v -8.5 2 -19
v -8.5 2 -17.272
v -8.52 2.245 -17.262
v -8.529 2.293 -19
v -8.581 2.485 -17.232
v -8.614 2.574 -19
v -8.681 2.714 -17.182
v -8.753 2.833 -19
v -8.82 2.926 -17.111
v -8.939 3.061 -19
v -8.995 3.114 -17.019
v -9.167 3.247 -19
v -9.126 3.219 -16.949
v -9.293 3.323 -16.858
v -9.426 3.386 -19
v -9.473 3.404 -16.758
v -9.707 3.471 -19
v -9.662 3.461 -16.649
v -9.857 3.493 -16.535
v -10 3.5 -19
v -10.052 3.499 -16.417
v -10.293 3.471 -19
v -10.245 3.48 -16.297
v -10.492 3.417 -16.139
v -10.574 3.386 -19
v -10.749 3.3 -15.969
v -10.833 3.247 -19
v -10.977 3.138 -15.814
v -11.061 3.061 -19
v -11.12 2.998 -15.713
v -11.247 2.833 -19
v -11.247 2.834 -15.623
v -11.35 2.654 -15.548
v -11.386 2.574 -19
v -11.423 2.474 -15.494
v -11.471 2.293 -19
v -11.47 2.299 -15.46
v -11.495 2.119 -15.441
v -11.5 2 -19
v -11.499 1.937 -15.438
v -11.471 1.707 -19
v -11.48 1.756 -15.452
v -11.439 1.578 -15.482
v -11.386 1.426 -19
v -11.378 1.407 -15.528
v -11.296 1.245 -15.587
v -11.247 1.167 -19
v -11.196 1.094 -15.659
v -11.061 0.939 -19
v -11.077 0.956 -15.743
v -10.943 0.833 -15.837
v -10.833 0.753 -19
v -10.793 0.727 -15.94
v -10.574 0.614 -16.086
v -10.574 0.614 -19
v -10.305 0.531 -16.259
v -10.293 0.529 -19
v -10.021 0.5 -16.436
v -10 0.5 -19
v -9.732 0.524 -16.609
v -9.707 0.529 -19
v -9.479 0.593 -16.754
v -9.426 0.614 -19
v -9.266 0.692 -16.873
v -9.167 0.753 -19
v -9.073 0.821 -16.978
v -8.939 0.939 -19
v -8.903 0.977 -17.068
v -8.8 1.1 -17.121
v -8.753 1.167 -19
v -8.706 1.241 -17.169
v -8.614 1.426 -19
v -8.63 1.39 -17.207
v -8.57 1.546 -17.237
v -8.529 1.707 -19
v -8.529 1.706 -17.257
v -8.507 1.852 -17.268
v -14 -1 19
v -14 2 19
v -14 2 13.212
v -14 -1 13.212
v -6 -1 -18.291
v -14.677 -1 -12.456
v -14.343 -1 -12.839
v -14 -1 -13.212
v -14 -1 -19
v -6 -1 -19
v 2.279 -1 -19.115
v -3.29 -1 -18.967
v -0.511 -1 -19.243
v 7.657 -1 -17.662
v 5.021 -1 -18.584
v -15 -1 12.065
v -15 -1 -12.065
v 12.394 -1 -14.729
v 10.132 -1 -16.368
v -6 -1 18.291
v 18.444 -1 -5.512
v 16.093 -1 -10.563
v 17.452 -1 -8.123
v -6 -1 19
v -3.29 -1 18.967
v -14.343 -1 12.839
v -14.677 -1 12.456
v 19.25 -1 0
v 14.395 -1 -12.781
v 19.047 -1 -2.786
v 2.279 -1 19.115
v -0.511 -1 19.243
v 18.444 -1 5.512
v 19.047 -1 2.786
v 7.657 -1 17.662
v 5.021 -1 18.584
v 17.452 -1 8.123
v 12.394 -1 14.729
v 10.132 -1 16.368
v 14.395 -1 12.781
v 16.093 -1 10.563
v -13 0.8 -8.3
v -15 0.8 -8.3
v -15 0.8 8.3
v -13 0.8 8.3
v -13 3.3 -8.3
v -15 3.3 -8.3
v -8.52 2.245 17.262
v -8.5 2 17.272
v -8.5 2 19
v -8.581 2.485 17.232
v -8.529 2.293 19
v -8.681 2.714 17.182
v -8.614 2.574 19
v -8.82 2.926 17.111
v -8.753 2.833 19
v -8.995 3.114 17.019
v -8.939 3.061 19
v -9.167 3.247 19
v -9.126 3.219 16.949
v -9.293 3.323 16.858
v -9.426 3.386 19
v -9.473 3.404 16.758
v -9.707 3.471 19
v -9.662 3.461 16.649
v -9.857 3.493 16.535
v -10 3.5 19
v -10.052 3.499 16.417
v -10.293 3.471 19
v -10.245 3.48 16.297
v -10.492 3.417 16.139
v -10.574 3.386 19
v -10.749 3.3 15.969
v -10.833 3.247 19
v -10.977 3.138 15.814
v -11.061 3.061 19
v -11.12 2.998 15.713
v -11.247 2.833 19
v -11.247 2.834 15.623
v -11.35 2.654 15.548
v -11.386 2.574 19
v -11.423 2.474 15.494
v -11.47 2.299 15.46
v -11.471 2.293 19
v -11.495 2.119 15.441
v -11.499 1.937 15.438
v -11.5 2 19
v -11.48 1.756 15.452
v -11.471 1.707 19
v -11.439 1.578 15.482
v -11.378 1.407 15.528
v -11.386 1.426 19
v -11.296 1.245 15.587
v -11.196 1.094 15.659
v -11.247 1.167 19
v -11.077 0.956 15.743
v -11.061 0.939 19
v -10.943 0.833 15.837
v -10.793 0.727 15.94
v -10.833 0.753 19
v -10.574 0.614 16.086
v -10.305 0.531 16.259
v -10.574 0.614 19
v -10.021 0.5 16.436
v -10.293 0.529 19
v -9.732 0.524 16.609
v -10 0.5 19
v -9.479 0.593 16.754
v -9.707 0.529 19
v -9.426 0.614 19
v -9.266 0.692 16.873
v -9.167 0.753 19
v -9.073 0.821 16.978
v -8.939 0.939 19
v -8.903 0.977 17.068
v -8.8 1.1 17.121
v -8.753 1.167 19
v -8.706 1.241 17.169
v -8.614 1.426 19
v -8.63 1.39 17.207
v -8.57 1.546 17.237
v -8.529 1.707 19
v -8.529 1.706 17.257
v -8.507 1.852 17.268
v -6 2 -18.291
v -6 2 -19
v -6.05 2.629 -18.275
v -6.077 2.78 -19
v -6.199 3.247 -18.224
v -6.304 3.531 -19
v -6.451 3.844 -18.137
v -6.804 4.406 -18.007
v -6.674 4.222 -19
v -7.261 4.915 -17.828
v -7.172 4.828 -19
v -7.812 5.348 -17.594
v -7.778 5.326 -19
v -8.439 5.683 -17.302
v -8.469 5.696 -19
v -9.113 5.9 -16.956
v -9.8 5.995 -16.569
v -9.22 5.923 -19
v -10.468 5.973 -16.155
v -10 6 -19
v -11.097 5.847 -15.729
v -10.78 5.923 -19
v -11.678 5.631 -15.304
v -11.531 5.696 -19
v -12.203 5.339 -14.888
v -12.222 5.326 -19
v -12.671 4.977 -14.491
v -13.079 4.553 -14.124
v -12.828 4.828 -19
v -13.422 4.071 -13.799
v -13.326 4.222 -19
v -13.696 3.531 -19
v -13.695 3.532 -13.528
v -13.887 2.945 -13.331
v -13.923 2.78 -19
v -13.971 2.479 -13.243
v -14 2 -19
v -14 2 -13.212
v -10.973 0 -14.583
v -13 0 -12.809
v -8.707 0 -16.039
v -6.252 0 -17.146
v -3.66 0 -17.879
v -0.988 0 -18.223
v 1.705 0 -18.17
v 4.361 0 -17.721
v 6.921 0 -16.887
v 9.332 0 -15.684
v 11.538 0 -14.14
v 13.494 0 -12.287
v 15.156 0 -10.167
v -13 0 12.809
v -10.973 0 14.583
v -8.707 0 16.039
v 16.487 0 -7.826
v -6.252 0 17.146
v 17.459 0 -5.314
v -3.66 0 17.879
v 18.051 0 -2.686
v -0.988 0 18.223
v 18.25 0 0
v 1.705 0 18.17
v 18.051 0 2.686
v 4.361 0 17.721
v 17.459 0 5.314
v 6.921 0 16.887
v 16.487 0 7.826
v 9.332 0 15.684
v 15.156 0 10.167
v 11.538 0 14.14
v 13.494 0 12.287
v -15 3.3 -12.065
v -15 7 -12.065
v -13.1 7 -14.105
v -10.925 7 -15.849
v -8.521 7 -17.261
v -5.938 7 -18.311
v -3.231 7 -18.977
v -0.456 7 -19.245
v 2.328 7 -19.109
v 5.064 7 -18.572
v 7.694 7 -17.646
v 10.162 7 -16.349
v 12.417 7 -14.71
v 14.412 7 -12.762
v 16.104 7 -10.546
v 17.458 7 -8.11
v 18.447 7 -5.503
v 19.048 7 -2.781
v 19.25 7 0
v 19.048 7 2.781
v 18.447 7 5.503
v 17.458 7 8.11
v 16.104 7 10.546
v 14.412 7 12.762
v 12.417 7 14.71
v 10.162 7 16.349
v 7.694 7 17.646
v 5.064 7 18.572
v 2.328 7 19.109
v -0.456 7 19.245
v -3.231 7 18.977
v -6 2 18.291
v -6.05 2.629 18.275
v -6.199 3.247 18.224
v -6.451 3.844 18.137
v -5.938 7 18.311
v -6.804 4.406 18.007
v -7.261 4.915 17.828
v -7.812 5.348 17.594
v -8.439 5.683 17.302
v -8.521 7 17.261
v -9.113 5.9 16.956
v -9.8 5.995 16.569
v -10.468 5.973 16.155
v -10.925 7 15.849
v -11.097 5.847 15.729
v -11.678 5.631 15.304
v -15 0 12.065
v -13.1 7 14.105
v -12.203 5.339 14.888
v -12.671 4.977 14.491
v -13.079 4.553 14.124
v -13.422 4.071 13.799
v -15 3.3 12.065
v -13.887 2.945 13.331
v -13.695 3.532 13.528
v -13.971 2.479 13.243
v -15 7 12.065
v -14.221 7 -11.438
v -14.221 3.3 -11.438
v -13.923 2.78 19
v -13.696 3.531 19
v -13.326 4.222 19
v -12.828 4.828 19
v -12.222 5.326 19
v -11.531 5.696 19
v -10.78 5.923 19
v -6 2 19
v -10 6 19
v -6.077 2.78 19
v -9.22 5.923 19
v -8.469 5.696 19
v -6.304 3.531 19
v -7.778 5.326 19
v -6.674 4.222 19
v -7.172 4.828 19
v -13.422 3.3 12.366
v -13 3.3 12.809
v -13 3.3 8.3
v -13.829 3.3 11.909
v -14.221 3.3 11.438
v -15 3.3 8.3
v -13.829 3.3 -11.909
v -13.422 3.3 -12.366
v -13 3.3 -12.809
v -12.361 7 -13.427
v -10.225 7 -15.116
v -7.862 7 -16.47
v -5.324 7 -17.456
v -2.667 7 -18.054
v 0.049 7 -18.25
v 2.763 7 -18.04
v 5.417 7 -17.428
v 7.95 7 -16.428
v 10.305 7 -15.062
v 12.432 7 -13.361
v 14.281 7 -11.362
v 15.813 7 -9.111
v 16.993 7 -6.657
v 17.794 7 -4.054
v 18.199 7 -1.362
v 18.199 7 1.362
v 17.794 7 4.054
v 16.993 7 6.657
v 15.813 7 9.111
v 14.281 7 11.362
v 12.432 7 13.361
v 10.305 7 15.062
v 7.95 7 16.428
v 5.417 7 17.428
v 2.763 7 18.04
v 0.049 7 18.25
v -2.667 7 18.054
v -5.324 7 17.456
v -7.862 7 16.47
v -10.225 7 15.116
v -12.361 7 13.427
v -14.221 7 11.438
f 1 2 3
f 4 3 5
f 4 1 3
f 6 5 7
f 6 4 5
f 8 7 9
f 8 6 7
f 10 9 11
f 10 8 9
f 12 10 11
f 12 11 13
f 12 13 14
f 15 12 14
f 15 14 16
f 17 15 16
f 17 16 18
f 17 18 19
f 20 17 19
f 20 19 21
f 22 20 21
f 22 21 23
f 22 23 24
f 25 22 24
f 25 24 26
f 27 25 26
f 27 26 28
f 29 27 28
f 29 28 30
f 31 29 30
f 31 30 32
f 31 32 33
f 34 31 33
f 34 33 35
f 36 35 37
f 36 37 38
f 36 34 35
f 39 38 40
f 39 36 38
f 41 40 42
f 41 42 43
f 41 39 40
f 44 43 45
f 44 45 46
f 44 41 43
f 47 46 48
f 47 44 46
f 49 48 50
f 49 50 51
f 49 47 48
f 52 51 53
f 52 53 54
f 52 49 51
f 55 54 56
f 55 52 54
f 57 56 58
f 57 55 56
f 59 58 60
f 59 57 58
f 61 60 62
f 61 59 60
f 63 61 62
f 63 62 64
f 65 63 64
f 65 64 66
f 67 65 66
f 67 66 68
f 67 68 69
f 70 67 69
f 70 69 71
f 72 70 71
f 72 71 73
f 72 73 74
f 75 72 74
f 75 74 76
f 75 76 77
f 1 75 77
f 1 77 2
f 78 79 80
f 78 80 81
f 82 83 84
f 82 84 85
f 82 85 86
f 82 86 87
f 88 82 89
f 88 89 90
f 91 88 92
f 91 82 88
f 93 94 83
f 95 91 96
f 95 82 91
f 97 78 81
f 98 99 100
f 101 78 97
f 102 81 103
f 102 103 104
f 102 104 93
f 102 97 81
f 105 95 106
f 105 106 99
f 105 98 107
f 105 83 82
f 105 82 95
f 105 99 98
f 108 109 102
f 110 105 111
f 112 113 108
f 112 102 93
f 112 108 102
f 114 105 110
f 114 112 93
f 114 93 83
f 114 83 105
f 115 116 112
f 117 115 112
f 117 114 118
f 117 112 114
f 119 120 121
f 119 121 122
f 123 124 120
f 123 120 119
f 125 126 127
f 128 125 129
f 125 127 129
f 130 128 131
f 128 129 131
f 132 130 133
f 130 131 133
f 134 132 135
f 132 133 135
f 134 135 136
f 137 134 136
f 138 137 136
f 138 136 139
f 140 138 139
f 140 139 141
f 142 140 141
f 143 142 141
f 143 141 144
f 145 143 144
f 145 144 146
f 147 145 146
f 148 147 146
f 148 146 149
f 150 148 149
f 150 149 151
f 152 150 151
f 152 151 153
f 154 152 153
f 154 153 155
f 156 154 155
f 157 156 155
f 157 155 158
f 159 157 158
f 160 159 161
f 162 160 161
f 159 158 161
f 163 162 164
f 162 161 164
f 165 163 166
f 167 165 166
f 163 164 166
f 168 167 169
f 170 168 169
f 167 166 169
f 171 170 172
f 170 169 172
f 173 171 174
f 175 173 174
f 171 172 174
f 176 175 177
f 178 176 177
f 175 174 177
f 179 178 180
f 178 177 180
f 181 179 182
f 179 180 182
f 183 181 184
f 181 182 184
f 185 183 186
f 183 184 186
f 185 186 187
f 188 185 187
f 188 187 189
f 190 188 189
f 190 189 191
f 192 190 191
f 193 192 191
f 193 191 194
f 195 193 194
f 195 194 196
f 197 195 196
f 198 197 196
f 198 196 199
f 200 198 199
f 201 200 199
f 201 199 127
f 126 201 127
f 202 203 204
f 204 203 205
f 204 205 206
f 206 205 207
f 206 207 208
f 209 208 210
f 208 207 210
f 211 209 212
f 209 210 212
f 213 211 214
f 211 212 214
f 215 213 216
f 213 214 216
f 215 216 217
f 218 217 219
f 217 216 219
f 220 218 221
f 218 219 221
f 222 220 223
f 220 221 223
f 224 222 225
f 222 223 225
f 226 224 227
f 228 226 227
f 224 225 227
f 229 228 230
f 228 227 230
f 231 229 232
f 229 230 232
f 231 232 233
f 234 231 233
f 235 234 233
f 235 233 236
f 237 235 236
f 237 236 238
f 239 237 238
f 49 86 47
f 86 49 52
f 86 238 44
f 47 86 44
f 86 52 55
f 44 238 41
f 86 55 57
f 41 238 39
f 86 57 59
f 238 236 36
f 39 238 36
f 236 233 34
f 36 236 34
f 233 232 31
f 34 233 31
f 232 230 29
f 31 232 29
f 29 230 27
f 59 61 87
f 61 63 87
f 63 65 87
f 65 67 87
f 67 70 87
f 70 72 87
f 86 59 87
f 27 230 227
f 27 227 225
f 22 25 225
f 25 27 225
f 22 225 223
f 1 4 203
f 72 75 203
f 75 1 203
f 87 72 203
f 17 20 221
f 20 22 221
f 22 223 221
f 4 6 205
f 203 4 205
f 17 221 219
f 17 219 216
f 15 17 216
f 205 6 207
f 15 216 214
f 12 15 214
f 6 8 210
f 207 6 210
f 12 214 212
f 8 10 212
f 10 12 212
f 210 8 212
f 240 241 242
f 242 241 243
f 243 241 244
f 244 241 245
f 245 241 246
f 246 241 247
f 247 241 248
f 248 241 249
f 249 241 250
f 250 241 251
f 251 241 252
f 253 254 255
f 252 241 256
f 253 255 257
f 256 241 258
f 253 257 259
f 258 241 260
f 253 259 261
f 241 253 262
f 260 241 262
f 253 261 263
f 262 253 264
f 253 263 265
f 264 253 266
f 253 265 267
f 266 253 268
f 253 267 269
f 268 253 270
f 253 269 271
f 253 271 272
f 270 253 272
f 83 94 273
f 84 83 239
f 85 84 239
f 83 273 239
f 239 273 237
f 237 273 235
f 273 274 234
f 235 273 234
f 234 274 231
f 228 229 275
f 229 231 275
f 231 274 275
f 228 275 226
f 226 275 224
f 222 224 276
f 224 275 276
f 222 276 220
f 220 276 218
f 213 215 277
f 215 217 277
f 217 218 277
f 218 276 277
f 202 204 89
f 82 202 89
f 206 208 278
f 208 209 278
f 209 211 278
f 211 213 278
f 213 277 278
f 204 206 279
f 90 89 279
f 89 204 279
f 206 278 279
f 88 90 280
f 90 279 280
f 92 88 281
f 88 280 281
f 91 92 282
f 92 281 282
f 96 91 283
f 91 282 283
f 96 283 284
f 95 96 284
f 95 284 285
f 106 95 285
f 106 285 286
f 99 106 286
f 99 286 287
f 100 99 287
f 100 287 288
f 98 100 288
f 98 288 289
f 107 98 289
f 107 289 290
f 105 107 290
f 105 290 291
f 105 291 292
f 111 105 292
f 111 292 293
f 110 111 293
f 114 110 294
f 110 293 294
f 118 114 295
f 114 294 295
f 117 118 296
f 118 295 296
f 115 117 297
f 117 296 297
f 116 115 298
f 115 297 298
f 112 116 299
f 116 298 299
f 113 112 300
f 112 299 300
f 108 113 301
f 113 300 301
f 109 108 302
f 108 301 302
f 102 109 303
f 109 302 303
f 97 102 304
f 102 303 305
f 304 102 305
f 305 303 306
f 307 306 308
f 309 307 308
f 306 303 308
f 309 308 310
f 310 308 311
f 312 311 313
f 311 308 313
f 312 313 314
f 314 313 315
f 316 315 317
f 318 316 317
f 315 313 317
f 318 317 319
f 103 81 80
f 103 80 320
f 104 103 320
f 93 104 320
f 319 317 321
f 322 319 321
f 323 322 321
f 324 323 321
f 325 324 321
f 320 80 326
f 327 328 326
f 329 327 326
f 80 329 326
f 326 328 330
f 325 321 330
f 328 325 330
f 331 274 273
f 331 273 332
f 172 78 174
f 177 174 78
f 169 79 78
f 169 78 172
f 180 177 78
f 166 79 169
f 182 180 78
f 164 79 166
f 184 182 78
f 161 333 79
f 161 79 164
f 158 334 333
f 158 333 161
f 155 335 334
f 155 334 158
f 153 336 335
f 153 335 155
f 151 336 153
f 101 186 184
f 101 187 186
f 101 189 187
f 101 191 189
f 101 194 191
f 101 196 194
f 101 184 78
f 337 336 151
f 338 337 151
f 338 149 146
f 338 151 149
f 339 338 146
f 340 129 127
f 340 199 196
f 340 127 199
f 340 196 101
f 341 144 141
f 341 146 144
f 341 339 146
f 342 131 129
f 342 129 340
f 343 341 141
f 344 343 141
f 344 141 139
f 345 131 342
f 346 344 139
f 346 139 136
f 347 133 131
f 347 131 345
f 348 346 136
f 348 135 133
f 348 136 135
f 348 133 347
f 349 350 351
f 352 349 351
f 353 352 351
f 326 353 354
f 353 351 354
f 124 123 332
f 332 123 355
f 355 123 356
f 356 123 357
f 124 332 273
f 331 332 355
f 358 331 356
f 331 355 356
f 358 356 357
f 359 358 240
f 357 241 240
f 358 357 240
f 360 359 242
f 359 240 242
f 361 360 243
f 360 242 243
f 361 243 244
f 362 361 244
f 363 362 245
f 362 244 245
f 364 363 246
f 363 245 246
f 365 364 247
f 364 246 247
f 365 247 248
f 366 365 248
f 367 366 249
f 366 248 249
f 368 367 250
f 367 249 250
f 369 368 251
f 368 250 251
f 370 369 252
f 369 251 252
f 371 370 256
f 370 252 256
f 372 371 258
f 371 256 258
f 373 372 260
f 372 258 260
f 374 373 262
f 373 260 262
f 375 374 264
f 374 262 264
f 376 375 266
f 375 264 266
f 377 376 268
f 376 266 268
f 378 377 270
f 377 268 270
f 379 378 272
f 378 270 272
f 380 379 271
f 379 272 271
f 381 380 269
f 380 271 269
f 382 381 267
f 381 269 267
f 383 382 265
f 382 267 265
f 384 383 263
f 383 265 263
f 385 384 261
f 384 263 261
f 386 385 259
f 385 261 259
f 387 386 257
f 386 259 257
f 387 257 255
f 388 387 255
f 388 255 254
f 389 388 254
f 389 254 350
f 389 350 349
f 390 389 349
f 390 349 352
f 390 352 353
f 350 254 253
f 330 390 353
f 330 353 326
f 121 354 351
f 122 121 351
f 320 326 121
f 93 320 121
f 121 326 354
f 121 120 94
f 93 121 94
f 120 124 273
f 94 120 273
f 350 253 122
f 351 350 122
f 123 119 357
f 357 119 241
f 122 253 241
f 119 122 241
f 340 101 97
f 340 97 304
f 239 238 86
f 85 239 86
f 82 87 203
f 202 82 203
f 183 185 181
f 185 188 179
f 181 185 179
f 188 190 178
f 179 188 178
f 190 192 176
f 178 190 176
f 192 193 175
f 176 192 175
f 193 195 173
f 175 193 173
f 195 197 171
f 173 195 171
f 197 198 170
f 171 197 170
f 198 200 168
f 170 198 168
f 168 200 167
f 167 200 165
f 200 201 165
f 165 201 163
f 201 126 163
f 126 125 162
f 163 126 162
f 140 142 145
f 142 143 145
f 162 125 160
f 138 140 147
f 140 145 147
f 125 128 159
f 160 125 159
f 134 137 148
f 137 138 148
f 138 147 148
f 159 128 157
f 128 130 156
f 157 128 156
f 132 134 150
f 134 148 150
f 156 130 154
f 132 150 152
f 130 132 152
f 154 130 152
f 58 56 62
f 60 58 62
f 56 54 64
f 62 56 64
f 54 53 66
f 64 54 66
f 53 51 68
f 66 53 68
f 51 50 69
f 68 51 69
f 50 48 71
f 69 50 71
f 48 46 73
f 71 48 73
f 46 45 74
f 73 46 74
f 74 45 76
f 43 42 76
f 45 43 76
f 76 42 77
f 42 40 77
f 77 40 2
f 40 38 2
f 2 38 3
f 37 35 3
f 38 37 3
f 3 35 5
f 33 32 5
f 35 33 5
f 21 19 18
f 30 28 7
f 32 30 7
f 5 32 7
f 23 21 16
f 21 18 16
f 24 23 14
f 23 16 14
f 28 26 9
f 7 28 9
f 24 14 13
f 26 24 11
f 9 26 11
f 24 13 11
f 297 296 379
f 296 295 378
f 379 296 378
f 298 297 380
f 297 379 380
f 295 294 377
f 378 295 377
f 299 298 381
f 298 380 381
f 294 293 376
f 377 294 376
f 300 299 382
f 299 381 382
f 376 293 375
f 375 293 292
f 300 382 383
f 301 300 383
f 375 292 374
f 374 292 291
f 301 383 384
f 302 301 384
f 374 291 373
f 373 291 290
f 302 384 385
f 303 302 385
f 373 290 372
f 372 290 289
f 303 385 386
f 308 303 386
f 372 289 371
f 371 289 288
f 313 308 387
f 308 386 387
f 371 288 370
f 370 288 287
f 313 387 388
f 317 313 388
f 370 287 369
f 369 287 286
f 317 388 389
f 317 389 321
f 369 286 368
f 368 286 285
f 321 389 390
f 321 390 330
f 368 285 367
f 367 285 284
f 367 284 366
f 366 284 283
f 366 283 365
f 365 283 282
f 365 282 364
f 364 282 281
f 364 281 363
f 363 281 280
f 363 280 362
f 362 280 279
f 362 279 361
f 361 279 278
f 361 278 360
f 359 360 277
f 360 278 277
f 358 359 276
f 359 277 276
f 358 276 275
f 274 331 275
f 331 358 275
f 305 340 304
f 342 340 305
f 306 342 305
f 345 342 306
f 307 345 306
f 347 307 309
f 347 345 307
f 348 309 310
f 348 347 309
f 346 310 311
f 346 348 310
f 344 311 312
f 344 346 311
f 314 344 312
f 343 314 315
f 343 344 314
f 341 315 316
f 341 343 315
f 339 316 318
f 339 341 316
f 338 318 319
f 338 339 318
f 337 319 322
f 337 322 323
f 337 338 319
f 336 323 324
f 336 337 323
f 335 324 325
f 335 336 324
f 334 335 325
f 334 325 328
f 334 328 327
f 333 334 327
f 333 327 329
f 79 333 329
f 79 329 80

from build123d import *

# Parameters (mm, degrees)
BOSS_EXTRUDE1_DEPTH      = 7
BOSS_EXTRUDE2_DEPTH      = 1
SKETCH3_W                = 6.66403437
SKETCH3_H                = 33.73555596
CUT_EXTRUDE1_DEPTH       = 29.374724668
BOSS_EXTRUDE3_DEPTH      = 3.3
CUT_EXTRUDE2_DEPTH       = 3.7
SKETCH6_W                = 4
SKETCH6_H                = 16.6
CUT_EXTRUDE3_DEPTH       = 2.5
BOSS_EXTRUDE4_REACH      = 45.389
BOSS_EXTRUDE4_END_RADIUS = 19.25
SKETCH7_R                = 1.5


with BuildPart() as part:
    # Sketch1 → Boss-Extrude1 (new body)
    with BuildSketch(Plane(origin=(0, 0, 0), x_dir=(1, 0, 0), z_dir=(0, 1, 0))):
        with BuildLine():
            Line((-16, -10.703387314), (-16, 10.703387314))
            ThreePointArc((-16, 10.703387314), (19.25, 0), (-16, -10.703387314))
        make_face()
        with BuildLine():
            Line((-15, -10.395311443), (-15, 10.395311443))
            ThreePointArc((-15, 10.395311443), (18.25, 0), (-15, -10.395311443))
        make_face(mode=Mode.SUBTRACT)
    extrude(amount=BOSS_EXTRUDE1_DEPTH)

    # Sketch2 → Boss-Extrude2 (add)
    with BuildSketch(Plane.XZ):
        with BuildLine():
            Line((-16, 10.703387314), (-16, -10.703387314))
            ThreePointArc((-16, -10.703387314), (19.25, 0), (-16, 10.703387314))
        make_face()
    extrude(amount=BOSS_EXTRUDE2_DEPTH)

    # Sketch3 → Cut-Extrude1 (cut, through all)
    with BuildSketch(Plane(origin=(0, 7, 0), x_dir=(1, 0, 0), z_dir=(0, 1, 0))):
        with Locations((-18.332017185, -0.479198238)):
            Rectangle(SKETCH3_W, SKETCH3_H)
    extrude(amount=-CUT_EXTRUDE1_DEPTH, mode=Mode.SUBTRACT)

    # Sketch4 → Boss-Extrude3 (add)
    with BuildSketch(Plane(origin=(0, 0, 0), x_dir=(1, 0, 0), z_dir=(0, 1, 0))):
        Polygon((-15, 12.064928512), (-15, -12.064928512), (-13, -12.808688457), (-13, 12.808688457), align=None)
    extrude(amount=BOSS_EXTRUDE3_DEPTH)

    # Sketch5 → Cut-Extrude2 (cut)
    with BuildSketch(Plane(origin=(0, 7, 0), x_dir=(1, 0, 0), z_dir=(0, 1, 0))):
        Polygon((0, 0), (-15, -12.064928512), (-15, 12.064928512), align=None)
    extrude(amount=-CUT_EXTRUDE2_DEPTH, mode=Mode.SUBTRACT)

    # Sketch6 → Cut-Extrude3 (cut)
    with BuildSketch(Plane(origin=(0, 3.3, 0), x_dir=(1, 0, 0), z_dir=(0, 1, 0))):
        with Locations((-15, 0)):
            Rectangle(SKETCH6_W, SKETCH6_H)
    extrude(amount=-CUT_EXTRUDE3_DEPTH, mode=Mode.SUBTRACT)

    # Boss-Extrude4: up to this cylinder (the profile starts outside it)
    boss_extrude4_end = Plane(origin=(0, 0.5, 0), z_dir=(0, -1, 0)) * Cylinder(BOSS_EXTRUDE4_END_RADIUS, 130.278, mode=Mode.PRIVATE)
    # Sketch7 → Boss-Extrude4 (add, up to the surface)
    with BuildSketch(Plane.XY.offset(19), mode=Mode.PRIVATE) as boss_extrude4_sk1:
        with BuildLine():
            Line((-14, 2), (-14, -1))
            Line((-14, -1), (-6, -1))
            Line((-6, -1), (-6, 2))
            ThreePointArc((-6, 2), (-10, 6), (-14, 2))
        make_face()
        with Locations((-10, 2)):
            Circle(SKETCH7_R, mode=Mode.SUBTRACT)
    boss_extrude4_tool1 = extrude(boss_extrude4_sk1.sketch, amount=-BOSS_EXTRUDE4_REACH, mode=Mode.PRIVATE) - boss_extrude4_end
    boss_extrude4 = boss_extrude4_tool1.solids().sort_by_distance((-13.893699, 0.5, 19))[0]
    add(boss_extrude4)

    # Mirror1: Boss-Extrude4 across plane
    add(boss_extrude4.mirror(Plane.XY))


solid = part.part
